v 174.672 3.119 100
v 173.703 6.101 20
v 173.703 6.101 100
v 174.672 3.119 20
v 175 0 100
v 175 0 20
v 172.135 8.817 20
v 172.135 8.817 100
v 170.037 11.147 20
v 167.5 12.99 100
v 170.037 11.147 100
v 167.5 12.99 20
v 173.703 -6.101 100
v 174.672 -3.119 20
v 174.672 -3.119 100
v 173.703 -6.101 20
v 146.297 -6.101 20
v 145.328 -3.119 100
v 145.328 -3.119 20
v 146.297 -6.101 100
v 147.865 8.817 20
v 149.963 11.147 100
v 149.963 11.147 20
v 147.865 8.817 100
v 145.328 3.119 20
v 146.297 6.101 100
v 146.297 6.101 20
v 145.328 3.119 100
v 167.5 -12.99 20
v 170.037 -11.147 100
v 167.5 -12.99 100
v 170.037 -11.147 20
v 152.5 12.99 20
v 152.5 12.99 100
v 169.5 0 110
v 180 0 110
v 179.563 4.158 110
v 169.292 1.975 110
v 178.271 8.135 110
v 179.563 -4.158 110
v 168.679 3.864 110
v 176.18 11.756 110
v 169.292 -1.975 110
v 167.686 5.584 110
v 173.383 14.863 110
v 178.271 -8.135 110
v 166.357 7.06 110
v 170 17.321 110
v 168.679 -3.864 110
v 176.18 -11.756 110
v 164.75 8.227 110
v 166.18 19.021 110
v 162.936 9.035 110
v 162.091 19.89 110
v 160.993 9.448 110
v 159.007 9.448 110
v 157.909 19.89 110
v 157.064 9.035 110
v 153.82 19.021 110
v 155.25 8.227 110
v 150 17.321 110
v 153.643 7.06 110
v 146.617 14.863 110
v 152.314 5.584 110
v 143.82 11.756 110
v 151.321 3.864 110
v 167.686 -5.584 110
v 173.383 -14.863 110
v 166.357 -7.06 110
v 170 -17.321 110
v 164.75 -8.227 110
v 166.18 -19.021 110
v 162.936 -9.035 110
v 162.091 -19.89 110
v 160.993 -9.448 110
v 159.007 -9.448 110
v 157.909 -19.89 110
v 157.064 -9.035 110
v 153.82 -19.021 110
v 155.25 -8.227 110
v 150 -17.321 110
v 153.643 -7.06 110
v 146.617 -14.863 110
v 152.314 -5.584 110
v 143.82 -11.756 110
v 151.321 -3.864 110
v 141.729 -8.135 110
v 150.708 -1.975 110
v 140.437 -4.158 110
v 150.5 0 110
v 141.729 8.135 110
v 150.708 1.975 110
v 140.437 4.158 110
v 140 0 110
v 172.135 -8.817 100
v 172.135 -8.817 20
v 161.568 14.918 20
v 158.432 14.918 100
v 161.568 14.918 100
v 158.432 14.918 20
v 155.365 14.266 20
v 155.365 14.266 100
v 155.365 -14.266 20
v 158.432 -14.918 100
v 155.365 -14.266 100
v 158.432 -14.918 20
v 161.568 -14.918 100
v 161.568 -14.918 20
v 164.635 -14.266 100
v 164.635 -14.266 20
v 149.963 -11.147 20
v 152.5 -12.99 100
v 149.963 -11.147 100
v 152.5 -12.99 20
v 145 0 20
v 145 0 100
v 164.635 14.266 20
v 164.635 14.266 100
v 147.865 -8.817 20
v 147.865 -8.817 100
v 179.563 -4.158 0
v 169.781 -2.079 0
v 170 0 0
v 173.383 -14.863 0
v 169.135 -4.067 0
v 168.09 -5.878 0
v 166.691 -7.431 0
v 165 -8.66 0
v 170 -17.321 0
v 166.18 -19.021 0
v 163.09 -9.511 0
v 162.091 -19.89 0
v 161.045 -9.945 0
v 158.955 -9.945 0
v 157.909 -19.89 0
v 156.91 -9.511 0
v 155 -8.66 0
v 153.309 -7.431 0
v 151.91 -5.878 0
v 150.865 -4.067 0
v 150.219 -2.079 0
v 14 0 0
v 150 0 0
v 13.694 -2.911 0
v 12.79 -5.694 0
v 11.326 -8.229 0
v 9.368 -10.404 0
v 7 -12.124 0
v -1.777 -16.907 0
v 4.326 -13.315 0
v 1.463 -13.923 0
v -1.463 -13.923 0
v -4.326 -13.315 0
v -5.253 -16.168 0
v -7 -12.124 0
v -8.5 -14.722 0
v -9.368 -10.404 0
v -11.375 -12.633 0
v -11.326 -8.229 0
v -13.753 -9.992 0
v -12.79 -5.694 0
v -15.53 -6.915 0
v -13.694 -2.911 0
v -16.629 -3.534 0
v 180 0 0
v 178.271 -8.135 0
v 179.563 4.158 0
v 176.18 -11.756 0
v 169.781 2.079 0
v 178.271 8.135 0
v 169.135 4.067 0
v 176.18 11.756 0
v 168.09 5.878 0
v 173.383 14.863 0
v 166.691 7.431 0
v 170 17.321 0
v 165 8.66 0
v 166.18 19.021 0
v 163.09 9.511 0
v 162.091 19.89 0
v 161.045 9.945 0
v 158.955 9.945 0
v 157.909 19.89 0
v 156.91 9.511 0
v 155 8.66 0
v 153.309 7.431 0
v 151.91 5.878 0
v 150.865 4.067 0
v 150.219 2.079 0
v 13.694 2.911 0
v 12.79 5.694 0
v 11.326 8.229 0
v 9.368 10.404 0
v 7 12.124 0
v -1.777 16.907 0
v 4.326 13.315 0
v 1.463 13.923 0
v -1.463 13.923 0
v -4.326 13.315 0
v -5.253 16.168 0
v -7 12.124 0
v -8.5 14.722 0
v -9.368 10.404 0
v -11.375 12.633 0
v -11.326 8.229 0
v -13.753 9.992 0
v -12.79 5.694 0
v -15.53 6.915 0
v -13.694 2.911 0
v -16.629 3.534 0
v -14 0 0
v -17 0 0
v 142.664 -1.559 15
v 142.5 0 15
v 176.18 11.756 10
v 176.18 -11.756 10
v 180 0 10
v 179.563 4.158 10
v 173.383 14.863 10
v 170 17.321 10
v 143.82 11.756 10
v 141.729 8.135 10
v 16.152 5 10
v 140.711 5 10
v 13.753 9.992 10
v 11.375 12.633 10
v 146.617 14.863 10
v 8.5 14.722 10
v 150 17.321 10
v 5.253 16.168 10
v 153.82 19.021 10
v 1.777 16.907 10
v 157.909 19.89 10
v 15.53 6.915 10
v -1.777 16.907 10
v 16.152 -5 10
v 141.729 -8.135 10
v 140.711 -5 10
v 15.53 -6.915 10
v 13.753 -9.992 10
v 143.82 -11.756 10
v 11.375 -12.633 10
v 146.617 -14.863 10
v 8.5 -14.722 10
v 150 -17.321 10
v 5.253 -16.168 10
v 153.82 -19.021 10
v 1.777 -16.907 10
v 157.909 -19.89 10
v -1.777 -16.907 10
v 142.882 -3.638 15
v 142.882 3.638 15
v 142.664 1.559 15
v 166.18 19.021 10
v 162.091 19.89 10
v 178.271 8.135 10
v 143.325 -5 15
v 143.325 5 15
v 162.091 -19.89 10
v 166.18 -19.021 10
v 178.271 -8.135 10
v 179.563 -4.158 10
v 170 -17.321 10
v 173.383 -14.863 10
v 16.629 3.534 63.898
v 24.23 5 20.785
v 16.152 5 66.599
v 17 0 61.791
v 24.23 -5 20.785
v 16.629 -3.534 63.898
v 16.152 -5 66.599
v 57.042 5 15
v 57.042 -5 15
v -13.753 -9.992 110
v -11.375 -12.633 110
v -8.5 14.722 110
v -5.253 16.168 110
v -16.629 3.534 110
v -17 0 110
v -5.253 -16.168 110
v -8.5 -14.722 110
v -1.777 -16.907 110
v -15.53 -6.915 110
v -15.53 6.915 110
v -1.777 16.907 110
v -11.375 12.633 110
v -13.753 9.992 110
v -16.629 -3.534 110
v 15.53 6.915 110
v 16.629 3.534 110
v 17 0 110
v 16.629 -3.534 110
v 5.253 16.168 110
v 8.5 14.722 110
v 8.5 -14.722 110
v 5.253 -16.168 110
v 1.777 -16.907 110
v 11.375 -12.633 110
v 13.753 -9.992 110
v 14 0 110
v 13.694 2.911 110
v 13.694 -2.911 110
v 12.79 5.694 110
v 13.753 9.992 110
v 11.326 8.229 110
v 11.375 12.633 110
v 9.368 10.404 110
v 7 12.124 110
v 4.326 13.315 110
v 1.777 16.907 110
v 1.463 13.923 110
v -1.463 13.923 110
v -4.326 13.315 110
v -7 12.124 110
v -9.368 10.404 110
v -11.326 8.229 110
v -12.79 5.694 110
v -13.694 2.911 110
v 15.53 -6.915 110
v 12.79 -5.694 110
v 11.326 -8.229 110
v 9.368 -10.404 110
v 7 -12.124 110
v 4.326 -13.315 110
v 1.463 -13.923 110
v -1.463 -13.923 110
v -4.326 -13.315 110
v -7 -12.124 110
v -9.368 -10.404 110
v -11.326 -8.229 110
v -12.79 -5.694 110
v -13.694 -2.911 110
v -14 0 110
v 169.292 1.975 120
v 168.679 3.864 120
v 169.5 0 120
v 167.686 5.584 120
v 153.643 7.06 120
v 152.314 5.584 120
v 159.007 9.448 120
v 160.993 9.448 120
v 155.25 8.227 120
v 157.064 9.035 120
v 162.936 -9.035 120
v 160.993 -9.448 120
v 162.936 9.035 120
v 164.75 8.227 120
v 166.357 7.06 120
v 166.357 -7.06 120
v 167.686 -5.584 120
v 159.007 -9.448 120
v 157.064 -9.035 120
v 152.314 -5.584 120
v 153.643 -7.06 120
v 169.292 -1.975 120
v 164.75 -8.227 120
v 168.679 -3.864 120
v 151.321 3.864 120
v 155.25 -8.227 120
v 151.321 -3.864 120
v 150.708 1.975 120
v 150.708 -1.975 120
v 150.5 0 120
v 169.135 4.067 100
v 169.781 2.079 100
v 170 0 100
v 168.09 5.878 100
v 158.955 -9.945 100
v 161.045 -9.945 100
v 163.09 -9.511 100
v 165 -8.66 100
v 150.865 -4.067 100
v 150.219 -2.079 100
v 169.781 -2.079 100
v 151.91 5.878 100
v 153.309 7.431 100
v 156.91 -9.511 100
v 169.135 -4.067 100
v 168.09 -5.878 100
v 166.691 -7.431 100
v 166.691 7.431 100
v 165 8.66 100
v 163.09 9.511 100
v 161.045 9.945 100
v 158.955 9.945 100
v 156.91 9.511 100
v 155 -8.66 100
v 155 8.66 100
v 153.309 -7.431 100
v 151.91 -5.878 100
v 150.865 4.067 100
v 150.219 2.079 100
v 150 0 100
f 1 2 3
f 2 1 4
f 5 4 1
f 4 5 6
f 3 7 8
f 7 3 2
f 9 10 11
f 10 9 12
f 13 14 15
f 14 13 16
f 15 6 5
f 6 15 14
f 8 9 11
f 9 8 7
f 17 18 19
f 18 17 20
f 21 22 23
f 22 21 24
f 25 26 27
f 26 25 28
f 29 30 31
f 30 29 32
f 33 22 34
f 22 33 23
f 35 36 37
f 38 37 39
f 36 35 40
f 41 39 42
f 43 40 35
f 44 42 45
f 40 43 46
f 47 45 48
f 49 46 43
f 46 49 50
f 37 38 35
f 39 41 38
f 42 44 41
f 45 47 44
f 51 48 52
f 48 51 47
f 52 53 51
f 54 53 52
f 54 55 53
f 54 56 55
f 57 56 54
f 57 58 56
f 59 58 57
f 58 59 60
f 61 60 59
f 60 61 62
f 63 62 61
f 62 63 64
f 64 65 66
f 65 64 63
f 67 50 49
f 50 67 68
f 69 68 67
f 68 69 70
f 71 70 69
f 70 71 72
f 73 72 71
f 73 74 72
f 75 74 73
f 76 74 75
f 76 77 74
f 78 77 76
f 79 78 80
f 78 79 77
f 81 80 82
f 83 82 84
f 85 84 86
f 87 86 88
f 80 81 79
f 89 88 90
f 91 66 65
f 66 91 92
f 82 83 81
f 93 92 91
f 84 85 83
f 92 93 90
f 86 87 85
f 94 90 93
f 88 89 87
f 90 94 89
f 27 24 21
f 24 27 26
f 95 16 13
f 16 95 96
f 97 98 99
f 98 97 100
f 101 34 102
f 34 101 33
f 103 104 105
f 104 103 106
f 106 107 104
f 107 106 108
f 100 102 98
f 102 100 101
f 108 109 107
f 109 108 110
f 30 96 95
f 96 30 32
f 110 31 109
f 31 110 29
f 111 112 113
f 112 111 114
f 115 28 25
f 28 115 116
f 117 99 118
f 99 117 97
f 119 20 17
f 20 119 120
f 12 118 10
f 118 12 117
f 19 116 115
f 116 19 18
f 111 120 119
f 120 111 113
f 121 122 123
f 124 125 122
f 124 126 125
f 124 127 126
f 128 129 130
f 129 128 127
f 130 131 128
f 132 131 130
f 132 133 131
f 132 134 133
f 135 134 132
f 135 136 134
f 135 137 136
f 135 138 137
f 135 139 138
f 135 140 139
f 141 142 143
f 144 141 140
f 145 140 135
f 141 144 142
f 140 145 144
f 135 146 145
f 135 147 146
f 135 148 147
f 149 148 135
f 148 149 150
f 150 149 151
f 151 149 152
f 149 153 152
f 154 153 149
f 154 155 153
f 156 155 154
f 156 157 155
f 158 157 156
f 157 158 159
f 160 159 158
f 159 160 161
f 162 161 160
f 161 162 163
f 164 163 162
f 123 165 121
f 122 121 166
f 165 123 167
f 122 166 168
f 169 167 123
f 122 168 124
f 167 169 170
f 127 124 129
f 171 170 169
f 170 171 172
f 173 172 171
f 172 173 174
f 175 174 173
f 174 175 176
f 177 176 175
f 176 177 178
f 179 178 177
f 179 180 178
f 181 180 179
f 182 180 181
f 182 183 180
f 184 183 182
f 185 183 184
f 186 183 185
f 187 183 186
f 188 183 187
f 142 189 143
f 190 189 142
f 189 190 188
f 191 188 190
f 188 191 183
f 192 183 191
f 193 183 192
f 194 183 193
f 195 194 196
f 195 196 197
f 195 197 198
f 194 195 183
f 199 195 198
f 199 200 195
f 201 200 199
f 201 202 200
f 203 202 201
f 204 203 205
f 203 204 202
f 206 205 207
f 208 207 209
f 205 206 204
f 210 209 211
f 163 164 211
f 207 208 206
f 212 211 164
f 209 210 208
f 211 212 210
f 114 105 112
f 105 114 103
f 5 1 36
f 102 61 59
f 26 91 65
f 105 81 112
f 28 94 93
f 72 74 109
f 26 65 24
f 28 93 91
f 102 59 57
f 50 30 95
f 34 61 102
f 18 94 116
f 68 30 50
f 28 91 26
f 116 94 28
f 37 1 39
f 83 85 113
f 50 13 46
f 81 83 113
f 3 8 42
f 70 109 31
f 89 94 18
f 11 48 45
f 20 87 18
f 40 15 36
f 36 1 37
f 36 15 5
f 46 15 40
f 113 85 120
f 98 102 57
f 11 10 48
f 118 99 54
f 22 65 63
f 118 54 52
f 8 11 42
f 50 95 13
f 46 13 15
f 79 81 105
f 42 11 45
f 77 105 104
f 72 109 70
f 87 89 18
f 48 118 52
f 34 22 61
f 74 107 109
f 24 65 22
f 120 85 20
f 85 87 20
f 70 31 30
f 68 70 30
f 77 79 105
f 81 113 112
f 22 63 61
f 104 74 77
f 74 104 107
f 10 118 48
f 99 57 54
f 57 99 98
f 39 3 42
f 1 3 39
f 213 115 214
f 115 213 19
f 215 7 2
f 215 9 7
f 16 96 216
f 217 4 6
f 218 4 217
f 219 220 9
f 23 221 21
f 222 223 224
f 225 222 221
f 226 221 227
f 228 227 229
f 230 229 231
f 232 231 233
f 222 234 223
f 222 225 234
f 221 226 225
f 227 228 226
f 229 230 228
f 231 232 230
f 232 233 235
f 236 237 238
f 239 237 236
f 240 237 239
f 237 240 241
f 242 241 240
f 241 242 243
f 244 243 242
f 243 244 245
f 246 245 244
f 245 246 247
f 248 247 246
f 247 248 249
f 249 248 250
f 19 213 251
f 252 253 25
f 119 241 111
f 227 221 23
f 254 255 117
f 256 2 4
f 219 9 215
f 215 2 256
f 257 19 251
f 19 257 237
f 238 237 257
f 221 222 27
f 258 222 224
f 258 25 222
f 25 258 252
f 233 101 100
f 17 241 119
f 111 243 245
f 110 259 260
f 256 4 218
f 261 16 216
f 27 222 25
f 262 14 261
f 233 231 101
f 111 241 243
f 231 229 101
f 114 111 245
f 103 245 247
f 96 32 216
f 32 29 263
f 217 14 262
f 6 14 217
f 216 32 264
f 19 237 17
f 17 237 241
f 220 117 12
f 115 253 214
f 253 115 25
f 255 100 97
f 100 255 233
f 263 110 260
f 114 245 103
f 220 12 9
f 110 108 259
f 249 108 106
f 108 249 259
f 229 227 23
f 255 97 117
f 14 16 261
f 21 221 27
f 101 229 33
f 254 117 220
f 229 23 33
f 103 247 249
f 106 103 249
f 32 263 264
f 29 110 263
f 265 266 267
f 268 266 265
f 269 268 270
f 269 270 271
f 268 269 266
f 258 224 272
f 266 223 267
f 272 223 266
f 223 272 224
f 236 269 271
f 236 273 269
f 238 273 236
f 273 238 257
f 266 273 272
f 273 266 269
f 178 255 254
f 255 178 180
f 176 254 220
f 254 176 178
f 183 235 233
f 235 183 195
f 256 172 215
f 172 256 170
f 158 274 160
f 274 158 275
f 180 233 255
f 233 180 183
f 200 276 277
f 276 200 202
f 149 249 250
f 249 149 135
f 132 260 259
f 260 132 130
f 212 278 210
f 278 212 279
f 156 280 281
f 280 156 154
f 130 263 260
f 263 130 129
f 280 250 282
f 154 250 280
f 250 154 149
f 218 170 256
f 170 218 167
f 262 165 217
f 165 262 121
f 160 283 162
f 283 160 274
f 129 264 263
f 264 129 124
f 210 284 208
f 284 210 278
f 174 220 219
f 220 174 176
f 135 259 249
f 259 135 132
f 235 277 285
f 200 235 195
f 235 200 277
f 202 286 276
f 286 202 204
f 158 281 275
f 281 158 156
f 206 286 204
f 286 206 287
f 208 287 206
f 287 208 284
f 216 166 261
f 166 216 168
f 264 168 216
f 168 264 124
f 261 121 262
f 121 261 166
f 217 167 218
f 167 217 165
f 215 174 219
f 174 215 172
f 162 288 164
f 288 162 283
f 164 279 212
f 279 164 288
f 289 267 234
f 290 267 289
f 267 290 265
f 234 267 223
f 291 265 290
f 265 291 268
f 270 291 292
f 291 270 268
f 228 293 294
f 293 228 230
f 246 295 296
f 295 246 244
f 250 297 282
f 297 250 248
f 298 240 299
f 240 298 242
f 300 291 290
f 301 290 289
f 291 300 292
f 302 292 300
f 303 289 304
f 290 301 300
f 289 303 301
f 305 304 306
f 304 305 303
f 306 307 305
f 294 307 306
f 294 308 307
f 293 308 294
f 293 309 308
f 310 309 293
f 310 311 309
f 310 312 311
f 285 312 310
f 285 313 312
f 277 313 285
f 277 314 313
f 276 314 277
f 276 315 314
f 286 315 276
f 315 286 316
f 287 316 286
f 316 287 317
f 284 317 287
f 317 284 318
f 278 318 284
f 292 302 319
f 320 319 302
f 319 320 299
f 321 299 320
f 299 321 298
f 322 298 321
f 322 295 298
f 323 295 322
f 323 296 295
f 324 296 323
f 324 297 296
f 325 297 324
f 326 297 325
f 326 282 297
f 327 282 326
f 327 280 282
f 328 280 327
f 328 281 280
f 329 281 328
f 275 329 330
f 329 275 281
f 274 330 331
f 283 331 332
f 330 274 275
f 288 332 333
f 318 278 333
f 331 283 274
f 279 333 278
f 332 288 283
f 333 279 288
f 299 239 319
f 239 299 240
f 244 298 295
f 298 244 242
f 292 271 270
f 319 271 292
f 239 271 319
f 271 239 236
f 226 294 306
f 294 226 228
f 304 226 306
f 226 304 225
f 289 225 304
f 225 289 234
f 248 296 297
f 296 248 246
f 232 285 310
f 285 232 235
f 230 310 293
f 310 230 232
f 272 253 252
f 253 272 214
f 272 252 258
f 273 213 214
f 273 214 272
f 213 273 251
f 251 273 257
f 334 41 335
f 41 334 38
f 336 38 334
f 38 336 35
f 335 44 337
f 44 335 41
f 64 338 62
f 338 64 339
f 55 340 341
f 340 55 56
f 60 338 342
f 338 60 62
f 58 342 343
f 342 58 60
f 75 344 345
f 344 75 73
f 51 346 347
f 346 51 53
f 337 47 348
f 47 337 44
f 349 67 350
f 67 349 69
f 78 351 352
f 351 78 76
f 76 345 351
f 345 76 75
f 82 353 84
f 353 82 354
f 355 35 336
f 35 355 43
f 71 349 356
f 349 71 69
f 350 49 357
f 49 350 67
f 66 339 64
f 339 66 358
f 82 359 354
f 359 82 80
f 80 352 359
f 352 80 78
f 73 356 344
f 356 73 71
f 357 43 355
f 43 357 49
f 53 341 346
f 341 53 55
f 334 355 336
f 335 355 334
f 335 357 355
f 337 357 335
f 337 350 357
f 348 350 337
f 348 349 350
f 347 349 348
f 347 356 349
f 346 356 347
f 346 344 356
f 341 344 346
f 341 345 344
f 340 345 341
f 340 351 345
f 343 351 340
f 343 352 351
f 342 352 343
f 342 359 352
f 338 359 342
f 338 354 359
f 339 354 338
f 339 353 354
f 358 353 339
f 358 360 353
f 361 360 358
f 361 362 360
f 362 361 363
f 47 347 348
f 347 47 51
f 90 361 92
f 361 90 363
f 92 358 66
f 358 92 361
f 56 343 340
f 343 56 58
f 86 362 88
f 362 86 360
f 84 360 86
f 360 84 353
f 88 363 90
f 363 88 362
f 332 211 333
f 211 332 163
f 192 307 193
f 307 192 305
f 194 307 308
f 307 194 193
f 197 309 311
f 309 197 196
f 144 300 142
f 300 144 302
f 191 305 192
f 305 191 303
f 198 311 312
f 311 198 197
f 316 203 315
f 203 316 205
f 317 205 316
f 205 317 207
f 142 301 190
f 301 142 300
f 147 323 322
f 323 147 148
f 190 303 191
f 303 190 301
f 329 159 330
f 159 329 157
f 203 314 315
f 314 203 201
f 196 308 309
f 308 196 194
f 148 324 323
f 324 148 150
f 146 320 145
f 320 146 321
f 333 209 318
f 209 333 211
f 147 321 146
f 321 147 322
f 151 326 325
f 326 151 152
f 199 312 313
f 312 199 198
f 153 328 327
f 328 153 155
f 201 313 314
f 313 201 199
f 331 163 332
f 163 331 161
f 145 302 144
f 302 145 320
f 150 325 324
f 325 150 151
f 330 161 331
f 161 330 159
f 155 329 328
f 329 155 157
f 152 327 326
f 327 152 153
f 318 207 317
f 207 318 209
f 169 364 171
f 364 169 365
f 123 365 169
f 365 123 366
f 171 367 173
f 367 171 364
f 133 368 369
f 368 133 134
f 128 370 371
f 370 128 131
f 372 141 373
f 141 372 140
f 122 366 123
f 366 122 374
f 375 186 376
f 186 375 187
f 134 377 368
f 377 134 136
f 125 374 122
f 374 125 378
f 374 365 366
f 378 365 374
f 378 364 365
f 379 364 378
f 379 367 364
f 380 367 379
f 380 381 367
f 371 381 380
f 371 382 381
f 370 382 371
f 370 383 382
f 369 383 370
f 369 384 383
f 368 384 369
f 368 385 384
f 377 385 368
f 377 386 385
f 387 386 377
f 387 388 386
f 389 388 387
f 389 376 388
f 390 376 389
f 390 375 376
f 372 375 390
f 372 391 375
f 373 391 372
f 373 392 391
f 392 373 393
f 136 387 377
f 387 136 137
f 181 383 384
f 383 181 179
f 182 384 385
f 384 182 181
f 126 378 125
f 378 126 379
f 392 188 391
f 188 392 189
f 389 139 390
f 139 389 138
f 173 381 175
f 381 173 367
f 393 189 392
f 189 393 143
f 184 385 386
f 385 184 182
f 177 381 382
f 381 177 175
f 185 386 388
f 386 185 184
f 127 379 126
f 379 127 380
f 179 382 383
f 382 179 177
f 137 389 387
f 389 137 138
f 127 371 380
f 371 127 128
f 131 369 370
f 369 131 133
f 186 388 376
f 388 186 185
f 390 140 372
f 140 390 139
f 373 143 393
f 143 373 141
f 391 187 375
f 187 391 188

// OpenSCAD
/*

Spool bar-holder

Fernando Jerez 2017

*/

rod_tube_diameter = 28;
spool_tube_diameter = 30;
spool_height = 80;
length = 160;
pin = "Yes"; // [Yes:Yes, No:No]

/* [Hidden] */

thickness = 3;
height = spool_height+20;
tube = rod_tube_diameter;
spooltube = spool_tube_diameter;


difference(){
    union(){
        hull(){
            cylinder(r = thickness+(tube/2),h = 10);
            translate([length,0,0]) cylinder(r = 5+(spooltube/2),h = 10);
        }
        cylinder(r = thickness+(tube/2),h = 10+height);
        translate([length,0,0]){
            cylinder(r = (spooltube/2),h = 10+height);
            translate([0,0,height]) cylinder(r1 = (spooltube/2), r2 = 5+(spooltube/2), h=10);
            translate([0,0,10]) cylinder( r1 = 5+(spooltube/2), r2 = (spooltube/2), h=10);
        }
        
        translate([0,-5,10]) cube([length,10,5]);
        translate([tube/2-8,-5,9]){
            rotate([0,-10,0]) cube([20,10,height*0.66]);
            translate([0,0,15]) rotate([0,100,0]) cube([10,10,height*0.66]);
        }
        if(pin=="Yes"){
            translate([length,0,height+10]) cylinder(r = 9.5,h = 10);
        }
    }
        
    
    cylinder(r = (tube/2),h = 10+height+0.1);
    translate([length,0,0]) cylinder(r = (10),h = height);
    
}
